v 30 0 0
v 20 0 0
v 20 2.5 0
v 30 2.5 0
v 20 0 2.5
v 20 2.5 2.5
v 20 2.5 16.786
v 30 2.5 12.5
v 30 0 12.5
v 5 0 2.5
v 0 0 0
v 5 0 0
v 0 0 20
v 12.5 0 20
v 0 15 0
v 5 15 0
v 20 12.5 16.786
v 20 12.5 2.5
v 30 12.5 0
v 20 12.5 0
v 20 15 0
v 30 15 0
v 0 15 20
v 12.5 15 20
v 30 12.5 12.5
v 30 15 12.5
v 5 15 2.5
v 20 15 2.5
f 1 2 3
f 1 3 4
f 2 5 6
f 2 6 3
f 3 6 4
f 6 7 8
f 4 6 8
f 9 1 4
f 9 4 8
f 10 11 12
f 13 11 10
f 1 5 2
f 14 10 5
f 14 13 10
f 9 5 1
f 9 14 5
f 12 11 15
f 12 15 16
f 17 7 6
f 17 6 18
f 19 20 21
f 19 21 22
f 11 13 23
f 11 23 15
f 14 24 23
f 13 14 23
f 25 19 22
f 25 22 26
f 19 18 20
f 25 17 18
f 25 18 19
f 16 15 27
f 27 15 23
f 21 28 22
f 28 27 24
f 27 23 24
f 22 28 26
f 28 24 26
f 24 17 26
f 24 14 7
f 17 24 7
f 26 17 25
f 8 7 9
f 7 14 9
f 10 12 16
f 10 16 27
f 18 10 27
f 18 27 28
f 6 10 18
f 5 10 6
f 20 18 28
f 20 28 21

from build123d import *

# Parameters (mm, degrees)
F1_DEPTH = 15
F2_DEPTH = 15
F3_W     = 10
F3_H     = 10
F4_DEPTH = 20.001
F5_DEPTH = 15.001


with BuildPart() as f1:
    # F0 (on Front) → F1 (new body)
    with BuildSketch(Plane.XZ):
        Polygon((0, 20), (0, 0), (5, 0), (5, 2.5), (20, 2.5), (20, 0), (30, 0), (30, 12.5), (12.5, 20), align=None)
    extrude(amount=-F1_DEPTH)

    # F0 (on Front) → F2 (join)
    with BuildSketch(Plane.XZ):
        Polygon((30, 20), (12.5, 20), (30, 12.5), align=None)
    extrude(amount=-F2_DEPTH)

    # F3 (on face) → F4 (cut, through all)
    with BuildSketch(Plane.XY.offset(20)):
        with Locations((25, 7.5)):
            Rectangle(F3_W, F3_H)
    extrude(amount=-F4_DEPTH, mode=Mode.SUBTRACT)

    # F0 (on Front) → F5 (cut, through all)
    with BuildSketch(Plane.XZ):
        Polygon((30, 20), (12.5, 20), (30, 12.5), align=None)
    extrude(amount=-F5_DEPTH, mode=Mode.SUBTRACT)


solid = f1.part
